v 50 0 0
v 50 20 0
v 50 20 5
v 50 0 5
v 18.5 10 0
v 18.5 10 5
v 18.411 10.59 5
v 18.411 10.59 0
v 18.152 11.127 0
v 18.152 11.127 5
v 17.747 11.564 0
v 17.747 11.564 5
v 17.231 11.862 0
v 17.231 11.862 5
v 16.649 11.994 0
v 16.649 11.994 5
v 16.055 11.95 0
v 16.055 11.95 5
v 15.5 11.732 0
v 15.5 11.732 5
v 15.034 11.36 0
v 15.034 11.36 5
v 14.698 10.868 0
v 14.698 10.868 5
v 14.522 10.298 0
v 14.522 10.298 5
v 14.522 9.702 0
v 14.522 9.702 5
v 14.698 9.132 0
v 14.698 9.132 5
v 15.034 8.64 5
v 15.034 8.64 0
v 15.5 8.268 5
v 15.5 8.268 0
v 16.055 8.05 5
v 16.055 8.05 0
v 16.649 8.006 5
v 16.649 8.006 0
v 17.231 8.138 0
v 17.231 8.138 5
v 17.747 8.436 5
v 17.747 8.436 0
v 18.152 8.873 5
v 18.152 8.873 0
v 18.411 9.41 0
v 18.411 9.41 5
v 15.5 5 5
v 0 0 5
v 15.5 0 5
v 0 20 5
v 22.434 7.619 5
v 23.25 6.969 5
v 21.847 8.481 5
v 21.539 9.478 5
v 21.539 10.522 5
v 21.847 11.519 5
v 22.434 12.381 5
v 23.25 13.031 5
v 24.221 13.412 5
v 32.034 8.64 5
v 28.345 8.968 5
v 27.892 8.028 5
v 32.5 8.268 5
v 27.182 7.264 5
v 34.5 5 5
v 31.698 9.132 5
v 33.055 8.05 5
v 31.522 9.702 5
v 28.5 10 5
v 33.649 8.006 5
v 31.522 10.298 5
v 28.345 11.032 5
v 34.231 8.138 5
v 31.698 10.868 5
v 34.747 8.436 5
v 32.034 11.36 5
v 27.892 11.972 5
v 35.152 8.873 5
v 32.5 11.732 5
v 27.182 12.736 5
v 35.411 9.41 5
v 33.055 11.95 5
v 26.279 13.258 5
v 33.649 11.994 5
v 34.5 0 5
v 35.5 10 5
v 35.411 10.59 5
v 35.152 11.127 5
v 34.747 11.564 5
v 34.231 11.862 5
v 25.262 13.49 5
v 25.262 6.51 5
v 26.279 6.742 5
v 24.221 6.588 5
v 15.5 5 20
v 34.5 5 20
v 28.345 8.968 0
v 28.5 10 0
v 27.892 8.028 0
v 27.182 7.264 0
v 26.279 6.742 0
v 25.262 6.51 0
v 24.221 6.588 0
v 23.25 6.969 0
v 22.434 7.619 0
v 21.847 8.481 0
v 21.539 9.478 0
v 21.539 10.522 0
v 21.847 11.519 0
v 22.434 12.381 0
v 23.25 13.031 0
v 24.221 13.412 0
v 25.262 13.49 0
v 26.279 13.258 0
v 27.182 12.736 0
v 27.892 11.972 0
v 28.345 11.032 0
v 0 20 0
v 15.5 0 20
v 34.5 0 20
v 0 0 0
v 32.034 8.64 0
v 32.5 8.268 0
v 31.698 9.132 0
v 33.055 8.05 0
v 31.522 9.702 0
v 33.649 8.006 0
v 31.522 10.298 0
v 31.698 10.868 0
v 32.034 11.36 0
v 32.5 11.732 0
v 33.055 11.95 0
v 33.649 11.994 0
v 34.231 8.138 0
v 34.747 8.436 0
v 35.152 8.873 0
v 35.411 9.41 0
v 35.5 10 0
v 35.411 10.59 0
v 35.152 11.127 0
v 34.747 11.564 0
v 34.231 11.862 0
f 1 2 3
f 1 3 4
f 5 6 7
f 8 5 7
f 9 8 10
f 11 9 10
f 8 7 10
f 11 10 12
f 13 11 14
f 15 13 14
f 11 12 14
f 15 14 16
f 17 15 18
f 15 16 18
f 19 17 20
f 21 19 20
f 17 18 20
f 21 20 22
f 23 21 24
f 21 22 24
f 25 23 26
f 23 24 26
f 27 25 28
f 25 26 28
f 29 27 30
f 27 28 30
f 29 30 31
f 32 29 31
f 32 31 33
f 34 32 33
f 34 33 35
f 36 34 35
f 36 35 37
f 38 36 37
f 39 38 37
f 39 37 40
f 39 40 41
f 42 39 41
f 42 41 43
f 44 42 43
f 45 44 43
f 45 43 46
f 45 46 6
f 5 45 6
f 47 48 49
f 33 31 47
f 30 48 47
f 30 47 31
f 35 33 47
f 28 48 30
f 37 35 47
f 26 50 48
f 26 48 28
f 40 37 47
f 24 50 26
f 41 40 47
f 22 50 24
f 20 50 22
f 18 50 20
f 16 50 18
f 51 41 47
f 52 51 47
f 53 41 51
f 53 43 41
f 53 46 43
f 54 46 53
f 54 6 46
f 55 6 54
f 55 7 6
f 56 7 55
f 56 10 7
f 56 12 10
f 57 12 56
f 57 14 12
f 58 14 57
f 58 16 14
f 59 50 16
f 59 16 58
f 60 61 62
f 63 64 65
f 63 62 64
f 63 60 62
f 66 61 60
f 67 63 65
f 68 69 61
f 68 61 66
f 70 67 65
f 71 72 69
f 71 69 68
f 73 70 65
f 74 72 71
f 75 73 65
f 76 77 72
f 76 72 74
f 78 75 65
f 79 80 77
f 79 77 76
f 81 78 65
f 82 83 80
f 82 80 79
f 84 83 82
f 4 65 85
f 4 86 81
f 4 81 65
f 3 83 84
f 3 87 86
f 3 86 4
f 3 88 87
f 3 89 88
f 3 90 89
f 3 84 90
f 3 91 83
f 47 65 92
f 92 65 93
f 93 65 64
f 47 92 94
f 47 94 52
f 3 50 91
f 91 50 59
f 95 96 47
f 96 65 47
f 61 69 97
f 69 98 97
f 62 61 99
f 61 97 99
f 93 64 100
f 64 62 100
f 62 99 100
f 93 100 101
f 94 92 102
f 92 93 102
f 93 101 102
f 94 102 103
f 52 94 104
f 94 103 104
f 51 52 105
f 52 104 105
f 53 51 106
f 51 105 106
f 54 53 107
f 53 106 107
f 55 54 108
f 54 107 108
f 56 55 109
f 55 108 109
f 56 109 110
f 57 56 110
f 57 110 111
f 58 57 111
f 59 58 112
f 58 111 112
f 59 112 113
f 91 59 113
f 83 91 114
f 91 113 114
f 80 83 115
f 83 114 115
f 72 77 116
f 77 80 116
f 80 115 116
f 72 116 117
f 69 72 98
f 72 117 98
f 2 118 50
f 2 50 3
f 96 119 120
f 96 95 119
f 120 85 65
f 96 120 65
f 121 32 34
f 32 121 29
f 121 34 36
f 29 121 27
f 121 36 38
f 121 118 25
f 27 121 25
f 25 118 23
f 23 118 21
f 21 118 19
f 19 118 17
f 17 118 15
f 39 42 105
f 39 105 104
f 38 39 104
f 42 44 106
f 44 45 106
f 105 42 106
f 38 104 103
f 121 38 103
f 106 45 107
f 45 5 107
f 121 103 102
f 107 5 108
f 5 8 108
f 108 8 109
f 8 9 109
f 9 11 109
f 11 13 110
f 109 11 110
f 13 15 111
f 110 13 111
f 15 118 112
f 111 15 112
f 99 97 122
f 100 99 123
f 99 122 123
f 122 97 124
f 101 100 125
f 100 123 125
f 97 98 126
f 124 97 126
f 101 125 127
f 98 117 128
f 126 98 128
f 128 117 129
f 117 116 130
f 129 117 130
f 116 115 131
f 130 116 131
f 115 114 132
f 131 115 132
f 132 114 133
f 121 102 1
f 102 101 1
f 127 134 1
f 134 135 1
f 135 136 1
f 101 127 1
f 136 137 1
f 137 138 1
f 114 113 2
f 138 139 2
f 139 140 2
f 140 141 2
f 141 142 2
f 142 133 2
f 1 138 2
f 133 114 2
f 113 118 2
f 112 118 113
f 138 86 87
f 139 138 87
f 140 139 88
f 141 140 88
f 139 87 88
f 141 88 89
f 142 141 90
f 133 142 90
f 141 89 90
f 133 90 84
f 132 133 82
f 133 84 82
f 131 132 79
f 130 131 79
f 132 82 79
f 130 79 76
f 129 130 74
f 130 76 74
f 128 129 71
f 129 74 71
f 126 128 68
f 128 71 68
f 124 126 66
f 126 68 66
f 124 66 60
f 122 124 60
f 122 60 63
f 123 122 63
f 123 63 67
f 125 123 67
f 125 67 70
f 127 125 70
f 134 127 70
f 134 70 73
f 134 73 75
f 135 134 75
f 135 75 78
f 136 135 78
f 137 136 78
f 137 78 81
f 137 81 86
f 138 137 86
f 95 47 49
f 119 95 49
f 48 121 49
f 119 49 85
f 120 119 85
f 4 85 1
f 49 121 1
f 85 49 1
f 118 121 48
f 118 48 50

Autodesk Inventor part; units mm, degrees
ref_plane "YZ Plane" through (0, 0, 0) normal (1, 0, 0) x (0, 1, 0)
ref_plane "XZ Plane" through (0, 0, 0) normal (0, 1, 0) x (-1, 0, 0)
ref_plane "XY Plane" through (0, 0, 0) normal (0, 0, 1) x (1, 0, 0)
sketch "Sketch1" plane through (0, 0, 0) normal (0, 0, 1) x (1, 0, 0)
  line L0 (0, 0) -> (50, 0)
  circle A0 centre (25, 10) radius 3.5
  line L1 (0, 0) -> (0, 20)
  line L2 (0, 20) -> (50, 20)
  line L3 (50, 20) -> (50, 0)
  point P0 (25, 0)
  dimension "d0" = 50
  dimension "d2" = 7
  dimension "d3" = 10
  dimension "d4" = 20
extrude "Extrusion1" add sketch "Sketch1" along normal blind 5
sketch "Sketch2" plane through (0, 0, 5) normal (0, 0, 1) x (1, 0, 0)
  line L0 (0, 0) -> (50, 0) projected
  line L1 (15.5, 0) -> (34.5, 0)
  line L2 (34.5, 0) -> (34.5, 5)
  line L3 (34.5, 5) -> (15.5, 5)
  line L4 (15.5, 5) -> (15.5, 0)
  point P0 (25, 0)
  dimension "d7" = 19
  dimension "d8" = 5
extrude "Extrusion2" add sketch "Sketch2" along normal blind 15
sketch "Sketch3" plane through (0, 0, 5) normal (0, 0, 1) x (1, 0, 0)
  circle A0 centre (16.5, 10) radius 2
  circle A1 centre (33.5, 10) radius 2
  line L0 (34.5, 5) -> (34.5, 0) projected
  line L1 (34.5, 0) -> (50, 0) projected
  line L2 (50, 0) -> (50, 20) projected
  line L3 (50, 20) -> (0, 20) projected
  line L4 (0, 20) -> (0, 0) projected
  line L5 (0, 0) -> (15.5, 0) projected
  line L6 (15.5, 0) -> (15.5, 5) projected
  line L7 (15.5, 5) -> (34.5, 5) projected
  circle A2 centre (25, 10) radius 3.5 projected
  line L8 (16.5, 10) -> (33.5, 10) construction
  dimension "d11" = 4
  dimension "d12" = 4
  dimension "d13" = 17
extrude "Extrusion3" cut sketch "Sketch3" against normal through all contours A0 | A1
properties part number "C005" material "Steel, Carbon"
